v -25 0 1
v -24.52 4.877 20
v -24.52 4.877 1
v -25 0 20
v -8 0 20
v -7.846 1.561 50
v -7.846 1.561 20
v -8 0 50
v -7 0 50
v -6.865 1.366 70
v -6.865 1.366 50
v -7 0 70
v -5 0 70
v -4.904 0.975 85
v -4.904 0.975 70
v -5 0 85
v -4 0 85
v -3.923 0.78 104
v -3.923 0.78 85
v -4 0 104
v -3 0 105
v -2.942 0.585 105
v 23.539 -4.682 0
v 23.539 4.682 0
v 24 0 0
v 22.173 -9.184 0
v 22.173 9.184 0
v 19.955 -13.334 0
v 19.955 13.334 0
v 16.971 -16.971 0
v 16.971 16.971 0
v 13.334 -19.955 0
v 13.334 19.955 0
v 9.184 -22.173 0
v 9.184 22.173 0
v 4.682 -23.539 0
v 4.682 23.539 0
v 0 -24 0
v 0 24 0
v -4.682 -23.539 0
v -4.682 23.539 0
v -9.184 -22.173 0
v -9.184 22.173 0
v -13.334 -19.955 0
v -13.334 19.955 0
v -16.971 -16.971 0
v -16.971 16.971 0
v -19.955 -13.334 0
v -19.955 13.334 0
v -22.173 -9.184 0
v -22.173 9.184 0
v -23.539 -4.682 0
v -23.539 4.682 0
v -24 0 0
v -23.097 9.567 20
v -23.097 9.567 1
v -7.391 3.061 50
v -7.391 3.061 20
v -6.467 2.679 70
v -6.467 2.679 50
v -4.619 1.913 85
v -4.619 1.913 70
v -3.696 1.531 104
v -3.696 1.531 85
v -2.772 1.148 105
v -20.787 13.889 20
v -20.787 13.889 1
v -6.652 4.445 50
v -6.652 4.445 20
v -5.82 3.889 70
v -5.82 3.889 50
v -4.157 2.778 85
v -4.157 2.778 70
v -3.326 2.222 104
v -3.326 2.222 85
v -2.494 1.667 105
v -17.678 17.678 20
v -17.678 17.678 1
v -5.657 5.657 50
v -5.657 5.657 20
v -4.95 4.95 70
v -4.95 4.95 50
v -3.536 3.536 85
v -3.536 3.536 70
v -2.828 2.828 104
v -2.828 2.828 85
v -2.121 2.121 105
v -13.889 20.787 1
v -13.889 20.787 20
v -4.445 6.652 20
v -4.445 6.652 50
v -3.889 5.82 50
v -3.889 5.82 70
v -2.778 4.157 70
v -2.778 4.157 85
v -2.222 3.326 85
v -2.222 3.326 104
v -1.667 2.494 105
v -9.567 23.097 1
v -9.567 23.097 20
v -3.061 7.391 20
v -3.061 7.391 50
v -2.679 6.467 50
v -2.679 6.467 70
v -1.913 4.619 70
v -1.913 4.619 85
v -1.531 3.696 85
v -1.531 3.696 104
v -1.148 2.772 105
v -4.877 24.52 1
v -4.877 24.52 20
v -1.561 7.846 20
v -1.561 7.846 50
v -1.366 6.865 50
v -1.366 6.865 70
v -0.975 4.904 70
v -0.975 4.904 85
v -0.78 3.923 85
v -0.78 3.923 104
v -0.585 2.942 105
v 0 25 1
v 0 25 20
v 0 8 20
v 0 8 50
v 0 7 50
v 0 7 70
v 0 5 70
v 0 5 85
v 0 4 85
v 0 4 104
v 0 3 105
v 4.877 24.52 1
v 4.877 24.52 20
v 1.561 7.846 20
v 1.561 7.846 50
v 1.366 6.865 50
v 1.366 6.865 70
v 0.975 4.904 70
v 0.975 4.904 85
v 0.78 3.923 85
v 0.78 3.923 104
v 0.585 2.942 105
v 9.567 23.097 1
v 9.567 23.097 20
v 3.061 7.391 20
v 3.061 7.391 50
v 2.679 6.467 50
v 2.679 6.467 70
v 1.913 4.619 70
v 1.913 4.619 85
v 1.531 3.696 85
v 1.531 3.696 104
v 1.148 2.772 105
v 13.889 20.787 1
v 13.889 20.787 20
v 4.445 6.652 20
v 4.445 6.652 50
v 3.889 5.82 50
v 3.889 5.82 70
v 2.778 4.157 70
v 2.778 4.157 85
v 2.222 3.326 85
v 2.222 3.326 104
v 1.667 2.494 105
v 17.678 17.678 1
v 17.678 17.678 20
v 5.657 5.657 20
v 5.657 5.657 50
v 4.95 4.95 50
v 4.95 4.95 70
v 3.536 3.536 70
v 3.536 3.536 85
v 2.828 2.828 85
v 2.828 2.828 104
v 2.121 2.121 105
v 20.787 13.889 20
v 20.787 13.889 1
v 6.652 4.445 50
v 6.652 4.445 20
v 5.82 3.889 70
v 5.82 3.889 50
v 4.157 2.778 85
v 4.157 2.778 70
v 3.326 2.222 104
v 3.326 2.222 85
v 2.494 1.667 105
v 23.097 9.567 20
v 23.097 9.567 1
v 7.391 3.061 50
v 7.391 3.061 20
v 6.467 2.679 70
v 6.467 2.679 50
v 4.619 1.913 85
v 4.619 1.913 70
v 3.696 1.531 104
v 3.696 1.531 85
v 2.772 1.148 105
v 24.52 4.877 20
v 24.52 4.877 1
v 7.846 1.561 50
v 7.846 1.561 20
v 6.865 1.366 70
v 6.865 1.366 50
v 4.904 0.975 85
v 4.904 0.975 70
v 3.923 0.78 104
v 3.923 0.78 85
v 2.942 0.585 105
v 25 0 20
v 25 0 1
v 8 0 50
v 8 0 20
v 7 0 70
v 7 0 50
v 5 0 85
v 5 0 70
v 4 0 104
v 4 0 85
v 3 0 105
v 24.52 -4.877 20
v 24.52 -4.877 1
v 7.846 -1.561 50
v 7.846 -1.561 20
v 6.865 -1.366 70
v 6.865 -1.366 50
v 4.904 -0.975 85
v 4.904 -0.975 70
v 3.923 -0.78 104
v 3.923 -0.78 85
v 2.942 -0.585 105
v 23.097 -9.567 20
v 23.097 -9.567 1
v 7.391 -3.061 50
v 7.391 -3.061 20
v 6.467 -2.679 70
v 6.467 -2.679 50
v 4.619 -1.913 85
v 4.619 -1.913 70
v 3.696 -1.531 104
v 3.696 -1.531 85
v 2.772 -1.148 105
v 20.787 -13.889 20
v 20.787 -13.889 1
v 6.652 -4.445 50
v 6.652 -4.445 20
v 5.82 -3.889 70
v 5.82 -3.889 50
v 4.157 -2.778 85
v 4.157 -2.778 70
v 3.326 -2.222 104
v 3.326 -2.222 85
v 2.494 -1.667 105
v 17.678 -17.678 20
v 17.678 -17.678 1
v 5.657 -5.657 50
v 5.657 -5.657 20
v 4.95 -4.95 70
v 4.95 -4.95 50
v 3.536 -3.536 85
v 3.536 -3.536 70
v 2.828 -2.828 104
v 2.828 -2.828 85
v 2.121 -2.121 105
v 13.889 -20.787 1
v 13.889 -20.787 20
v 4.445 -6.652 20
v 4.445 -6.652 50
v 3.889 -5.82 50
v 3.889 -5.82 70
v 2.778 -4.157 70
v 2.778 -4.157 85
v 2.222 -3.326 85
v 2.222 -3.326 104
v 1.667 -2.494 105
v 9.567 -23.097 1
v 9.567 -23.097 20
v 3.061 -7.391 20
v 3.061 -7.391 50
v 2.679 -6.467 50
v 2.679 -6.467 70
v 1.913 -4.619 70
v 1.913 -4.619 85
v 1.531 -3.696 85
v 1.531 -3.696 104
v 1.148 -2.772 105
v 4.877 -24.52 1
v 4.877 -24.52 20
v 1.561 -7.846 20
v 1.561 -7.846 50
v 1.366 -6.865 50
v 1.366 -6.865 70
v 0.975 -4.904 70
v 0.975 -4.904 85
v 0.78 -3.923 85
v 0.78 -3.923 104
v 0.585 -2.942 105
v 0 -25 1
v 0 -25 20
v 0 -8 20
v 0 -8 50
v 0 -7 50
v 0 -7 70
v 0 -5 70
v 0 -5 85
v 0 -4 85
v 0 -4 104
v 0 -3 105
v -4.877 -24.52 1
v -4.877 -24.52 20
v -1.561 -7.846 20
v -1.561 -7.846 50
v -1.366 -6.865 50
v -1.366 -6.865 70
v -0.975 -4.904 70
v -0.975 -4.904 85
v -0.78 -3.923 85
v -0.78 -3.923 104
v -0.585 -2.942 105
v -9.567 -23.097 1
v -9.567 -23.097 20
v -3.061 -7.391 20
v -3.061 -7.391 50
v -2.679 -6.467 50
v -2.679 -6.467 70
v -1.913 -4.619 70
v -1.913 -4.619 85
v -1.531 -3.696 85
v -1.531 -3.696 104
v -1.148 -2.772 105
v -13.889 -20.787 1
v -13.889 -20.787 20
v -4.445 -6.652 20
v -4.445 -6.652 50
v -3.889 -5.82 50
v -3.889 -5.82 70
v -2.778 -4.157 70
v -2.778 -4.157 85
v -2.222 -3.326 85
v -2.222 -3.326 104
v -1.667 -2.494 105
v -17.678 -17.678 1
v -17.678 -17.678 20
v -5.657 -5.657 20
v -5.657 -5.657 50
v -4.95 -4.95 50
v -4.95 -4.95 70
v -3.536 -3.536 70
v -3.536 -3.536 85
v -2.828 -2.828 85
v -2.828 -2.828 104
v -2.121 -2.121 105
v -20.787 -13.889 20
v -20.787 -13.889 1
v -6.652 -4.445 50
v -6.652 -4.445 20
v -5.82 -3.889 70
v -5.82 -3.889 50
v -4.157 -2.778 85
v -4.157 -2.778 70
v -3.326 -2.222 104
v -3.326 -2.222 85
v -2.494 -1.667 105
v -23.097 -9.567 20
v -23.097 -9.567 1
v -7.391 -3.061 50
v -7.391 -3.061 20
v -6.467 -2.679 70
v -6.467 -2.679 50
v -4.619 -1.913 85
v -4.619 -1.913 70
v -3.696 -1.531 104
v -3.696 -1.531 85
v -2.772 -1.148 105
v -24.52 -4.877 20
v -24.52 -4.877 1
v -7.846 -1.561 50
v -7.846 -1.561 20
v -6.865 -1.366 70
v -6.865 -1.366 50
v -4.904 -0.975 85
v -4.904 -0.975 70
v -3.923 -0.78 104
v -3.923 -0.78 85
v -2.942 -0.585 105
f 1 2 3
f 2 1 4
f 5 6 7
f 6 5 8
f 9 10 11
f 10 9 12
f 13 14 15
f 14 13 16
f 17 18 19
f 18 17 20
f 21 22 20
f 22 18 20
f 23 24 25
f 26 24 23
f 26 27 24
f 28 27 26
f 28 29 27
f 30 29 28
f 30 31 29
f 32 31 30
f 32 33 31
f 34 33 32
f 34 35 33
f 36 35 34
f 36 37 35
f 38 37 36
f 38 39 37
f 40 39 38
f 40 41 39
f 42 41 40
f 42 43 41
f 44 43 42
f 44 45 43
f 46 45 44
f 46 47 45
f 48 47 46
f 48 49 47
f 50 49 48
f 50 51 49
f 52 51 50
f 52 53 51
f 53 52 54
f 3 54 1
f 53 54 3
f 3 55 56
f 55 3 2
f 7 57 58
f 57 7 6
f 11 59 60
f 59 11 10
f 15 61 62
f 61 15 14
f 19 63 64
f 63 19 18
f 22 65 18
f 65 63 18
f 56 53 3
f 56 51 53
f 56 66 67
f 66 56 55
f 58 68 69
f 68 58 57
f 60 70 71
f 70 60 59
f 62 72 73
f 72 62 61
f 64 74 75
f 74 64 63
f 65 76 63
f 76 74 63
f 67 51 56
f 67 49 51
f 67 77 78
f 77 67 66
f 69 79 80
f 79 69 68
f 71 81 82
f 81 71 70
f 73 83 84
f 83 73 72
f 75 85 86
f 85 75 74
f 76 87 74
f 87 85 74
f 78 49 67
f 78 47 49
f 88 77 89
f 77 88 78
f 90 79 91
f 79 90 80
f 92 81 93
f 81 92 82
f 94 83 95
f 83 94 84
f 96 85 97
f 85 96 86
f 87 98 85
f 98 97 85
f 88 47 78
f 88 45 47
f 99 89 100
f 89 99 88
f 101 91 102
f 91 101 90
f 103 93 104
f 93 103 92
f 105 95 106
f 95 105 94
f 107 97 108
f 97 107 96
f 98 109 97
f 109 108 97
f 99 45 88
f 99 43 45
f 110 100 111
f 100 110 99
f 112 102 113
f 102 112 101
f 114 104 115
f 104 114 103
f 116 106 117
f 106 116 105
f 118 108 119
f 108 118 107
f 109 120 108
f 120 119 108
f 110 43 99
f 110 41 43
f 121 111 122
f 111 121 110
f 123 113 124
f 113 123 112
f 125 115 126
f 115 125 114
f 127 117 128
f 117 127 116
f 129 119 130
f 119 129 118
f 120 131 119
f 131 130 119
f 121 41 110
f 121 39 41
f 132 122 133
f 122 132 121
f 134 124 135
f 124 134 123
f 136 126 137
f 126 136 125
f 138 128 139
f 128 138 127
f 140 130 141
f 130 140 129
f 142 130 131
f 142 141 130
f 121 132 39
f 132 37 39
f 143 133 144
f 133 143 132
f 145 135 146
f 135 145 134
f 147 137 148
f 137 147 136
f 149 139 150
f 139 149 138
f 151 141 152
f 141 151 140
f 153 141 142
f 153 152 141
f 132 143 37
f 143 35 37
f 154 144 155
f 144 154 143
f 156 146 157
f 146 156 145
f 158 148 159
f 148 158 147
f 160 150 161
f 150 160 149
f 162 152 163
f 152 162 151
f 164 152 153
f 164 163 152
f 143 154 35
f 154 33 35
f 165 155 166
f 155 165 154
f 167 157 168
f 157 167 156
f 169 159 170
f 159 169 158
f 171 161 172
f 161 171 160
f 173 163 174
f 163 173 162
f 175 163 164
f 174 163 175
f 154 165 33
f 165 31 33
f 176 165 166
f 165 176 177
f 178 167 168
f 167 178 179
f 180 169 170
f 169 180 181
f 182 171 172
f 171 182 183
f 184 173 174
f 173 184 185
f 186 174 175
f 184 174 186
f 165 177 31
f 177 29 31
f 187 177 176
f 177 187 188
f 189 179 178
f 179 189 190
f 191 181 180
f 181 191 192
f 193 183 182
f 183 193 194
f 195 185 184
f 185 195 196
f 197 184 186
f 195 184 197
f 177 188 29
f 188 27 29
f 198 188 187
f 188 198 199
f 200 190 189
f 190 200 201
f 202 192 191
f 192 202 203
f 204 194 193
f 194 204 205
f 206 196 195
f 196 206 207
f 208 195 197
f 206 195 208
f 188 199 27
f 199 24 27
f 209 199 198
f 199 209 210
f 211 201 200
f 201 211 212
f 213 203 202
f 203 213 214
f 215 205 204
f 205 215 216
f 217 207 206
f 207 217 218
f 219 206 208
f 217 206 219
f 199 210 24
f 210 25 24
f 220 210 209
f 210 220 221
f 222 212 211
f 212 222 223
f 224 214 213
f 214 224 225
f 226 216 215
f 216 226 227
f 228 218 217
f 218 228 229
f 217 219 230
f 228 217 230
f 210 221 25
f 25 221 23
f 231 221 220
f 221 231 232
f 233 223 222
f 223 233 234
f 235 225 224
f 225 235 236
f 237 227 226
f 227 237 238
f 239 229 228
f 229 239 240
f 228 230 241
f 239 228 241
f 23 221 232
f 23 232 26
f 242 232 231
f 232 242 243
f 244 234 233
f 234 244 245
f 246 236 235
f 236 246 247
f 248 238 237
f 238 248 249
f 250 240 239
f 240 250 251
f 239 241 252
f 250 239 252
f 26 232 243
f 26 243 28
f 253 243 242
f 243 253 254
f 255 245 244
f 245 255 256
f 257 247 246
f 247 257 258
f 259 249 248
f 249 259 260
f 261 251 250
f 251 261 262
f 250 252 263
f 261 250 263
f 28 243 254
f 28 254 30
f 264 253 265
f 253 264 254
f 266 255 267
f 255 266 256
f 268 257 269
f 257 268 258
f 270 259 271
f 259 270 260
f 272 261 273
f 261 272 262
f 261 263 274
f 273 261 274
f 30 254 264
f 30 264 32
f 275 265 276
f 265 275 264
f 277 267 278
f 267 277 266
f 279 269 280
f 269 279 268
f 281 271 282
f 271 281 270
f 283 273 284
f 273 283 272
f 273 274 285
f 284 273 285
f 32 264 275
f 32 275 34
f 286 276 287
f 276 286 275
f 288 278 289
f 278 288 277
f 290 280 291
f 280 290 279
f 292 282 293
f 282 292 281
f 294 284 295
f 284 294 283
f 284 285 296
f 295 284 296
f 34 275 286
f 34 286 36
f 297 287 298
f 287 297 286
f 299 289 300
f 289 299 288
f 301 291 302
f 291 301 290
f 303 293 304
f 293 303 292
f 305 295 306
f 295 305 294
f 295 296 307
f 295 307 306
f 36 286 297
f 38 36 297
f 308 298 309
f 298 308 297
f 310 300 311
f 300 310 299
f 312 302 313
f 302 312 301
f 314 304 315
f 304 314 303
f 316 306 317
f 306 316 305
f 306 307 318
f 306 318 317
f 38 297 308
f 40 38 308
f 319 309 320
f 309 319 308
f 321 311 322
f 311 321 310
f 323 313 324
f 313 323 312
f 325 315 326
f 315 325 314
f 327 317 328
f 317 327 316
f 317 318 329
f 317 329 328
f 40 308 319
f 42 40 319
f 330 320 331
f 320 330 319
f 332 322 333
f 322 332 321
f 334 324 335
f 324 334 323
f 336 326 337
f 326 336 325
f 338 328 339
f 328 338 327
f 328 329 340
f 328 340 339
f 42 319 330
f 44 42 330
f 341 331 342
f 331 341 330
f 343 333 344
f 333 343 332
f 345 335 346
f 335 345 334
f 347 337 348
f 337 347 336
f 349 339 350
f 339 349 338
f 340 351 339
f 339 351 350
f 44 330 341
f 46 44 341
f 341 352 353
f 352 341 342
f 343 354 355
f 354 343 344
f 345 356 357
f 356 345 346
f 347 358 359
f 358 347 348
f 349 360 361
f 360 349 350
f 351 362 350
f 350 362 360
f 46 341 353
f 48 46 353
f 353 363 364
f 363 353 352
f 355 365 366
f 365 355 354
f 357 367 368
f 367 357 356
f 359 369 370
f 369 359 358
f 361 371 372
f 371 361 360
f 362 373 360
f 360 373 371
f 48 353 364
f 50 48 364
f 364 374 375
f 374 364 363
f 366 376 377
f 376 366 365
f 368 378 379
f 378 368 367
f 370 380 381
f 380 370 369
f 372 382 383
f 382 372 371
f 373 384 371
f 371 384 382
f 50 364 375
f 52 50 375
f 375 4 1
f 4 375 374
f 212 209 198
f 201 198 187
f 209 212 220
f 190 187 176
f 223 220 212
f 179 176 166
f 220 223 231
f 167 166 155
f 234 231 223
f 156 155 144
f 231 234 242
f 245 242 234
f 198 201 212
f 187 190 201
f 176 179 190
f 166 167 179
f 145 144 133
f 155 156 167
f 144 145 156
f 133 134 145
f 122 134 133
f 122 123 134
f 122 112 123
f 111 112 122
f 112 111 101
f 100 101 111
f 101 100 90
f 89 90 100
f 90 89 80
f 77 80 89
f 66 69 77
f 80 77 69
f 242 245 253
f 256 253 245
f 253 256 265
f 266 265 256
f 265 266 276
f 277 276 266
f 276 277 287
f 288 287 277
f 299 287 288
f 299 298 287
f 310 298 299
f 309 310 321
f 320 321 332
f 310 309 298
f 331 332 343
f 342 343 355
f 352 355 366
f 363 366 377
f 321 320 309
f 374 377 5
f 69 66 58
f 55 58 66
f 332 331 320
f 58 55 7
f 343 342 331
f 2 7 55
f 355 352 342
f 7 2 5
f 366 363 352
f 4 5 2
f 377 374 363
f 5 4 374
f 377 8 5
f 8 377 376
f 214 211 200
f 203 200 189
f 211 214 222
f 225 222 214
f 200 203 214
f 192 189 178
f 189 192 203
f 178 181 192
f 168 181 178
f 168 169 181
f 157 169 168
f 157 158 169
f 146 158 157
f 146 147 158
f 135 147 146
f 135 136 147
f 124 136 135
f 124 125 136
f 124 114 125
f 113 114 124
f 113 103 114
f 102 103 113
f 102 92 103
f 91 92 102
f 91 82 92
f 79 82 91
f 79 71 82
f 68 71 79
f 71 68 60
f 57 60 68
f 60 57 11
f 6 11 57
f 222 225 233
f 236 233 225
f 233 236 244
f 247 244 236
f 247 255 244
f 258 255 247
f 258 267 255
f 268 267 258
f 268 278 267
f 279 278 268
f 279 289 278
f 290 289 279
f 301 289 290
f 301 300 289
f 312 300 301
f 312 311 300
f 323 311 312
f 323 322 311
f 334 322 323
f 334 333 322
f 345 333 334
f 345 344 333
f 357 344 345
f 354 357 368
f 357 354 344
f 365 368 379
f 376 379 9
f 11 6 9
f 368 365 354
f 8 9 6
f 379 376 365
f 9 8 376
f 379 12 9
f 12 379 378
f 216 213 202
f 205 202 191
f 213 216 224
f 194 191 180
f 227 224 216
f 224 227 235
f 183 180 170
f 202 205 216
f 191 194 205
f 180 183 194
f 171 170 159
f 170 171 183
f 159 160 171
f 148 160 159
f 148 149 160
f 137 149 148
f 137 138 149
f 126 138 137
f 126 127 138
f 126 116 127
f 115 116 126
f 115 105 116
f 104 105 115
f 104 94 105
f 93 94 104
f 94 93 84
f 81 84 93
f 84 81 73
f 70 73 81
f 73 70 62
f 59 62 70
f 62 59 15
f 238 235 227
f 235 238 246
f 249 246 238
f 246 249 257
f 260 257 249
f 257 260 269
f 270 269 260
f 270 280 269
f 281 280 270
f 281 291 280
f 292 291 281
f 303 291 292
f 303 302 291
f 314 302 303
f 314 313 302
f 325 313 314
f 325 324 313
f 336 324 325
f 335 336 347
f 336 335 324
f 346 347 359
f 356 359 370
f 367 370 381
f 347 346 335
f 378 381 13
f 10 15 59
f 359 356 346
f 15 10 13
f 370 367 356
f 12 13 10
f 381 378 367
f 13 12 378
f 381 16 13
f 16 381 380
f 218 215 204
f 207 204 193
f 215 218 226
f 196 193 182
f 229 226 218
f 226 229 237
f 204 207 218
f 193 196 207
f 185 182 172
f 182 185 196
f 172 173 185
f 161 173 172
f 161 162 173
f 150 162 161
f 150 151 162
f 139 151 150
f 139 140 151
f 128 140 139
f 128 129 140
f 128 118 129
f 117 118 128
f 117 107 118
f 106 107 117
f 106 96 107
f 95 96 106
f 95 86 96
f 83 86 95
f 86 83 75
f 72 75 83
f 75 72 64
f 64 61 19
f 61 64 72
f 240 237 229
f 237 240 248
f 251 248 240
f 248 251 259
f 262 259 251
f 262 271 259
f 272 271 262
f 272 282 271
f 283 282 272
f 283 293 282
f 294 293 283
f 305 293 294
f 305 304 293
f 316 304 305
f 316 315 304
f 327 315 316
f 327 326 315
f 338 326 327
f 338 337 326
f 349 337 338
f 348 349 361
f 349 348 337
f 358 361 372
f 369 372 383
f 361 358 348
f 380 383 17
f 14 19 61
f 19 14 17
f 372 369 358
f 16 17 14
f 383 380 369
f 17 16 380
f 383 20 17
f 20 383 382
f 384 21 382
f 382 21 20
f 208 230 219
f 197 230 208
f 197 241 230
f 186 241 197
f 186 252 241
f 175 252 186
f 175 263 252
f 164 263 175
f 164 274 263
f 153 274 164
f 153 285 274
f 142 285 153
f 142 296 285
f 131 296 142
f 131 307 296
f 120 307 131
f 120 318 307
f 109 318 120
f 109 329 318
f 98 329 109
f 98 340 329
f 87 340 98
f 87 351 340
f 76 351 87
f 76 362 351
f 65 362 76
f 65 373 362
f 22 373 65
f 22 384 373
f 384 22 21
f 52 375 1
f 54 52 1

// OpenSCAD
$fn = 32;

// ----------------------------------------------------------------------
// Stepped shaft: diameters 50, 16, 14, 10, 8 mm, 105 mm long
// ----------------------------------------------------------------------

// --- parameters (mm) ---
d1 = 50;                  // step 1 diameter
len1 = 20;                // step 1 length
d2 = 16;                  // step 2 diameter
len2 = 30;                // step 2 length
d3 = 14;                  // step 3 diameter
len3 = 20;                // step 3 length
d4 = 10;                  // step 4 diameter
len4 = 15;                // step 4 length
d5 = 8;                   // step 5 diameter
len5 = 20;                // step 5 length
total = 105;              // overall length
chamfer = 1;              // end chamfer
key_w = 8;                // keyway width
key_d = 4;                // keyway depth
key_len = 14;             // keyway length
key_z = 88;               // keyway start along the shaft

/* closed turning profile: x is the radius, y is the length */
profile = [[0, 0], [25 - chamfer, 0], [25, chamfer], [25, 20], [8, 20], [8, 50], [7, 50], [7, 70], [5, 70], [5, 85], [4, 85], [4, 104], [3, 105], [0, 105]];

difference() {
  rotate_extrude() polygon(profile);
  /* keyway milled into the top of the largest step */
  translate([d1 / 2 - key_d, -key_w / 2, key_z]) cube([key_d + 1, key_w, key_len]);
}
